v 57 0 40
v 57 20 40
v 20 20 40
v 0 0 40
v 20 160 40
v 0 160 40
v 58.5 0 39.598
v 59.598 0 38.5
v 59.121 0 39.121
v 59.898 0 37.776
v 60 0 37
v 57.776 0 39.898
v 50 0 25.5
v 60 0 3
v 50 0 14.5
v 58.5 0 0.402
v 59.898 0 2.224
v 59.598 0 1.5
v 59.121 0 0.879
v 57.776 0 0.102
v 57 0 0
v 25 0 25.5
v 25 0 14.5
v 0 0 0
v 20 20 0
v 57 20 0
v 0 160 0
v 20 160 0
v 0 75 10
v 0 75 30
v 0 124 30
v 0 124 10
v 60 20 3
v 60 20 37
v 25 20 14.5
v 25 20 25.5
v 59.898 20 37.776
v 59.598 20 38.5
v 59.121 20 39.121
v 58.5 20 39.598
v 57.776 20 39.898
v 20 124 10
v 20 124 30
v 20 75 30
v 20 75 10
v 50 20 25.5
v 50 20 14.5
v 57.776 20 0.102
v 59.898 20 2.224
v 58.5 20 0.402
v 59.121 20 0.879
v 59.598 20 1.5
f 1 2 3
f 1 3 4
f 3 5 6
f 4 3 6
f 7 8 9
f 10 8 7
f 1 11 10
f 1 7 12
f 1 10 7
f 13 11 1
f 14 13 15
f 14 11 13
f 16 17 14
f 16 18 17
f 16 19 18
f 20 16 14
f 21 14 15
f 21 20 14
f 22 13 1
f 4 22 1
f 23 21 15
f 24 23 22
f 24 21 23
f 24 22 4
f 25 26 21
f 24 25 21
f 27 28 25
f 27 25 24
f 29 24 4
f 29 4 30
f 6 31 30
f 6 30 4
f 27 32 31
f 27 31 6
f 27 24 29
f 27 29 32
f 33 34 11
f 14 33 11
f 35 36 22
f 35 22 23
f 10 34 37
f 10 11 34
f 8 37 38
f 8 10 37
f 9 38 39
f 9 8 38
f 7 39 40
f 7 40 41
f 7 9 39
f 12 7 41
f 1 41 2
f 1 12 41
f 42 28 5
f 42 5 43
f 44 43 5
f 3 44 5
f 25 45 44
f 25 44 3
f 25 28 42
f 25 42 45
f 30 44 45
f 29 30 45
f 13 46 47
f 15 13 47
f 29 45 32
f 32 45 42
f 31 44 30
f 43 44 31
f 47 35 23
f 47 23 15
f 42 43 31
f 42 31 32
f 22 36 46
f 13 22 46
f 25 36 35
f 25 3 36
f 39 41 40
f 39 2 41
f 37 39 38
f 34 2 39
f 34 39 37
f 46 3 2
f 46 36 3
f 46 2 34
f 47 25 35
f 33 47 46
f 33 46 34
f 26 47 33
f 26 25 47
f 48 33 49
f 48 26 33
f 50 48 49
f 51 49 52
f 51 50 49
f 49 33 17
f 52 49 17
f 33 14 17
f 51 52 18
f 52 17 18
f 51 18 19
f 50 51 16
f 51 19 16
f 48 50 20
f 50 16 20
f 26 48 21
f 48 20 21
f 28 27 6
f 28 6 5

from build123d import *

# Parameters (mm, degrees)
BOSS_EXTRUDE1_DEPTH = 40
FILLET1_R           = 3
SKETCH2_W           = 25
SKETCH2_H           = 11
CUT_EXTRUDE1_DEPTH  = 158.48015748
SKETCH3_W           = 20
SKETCH3_H           = 49
CUT_EXTRUDE2_DEPTH  = 170.705627485


with BuildPart() as part:
    # Sketch1 → Boss-Extrude1 (new body)
    with BuildSketch(Plane.XY):
        Polygon((0, 0), (0, 160), (20, 160), (20, 20), (60, 20), (60, 0), align=None)
    extrude(amount=BOSS_EXTRUDE1_DEPTH)

    # Fillet1
    fillet1_edges = [part.edges().sort_by_distance(p)[0] for p in [
        (60, 10, 40),
        (60, 10, 0),
    ]]
    fillet(fillet1_edges, radius=FILLET1_R)

    # Sketch2 → Cut-Extrude1 (cut, through all)
    with BuildSketch(Plane(origin=(0, 20, 0), x_dir=(1, 0, 0), z_dir=(0, 1, 0))):
        with Locations((37.5, -20)):
            Rectangle(SKETCH2_W, SKETCH2_H)
    extrude(amount=-CUT_EXTRUDE1_DEPTH, mode=Mode.SUBTRACT)

    # Sketch3 → Cut-Extrude2 (cut, through all)
    with BuildSketch(Plane(origin=(20, 0, 0), x_dir=(0, 0, -1), z_dir=(1, 0, 0))):
        with Locations((-20, 99.5)):
            Rectangle(SKETCH3_W, SKETCH3_H)
    extrude(amount=-CUT_EXTRUDE2_DEPTH, mode=Mode.SUBTRACT)


solid = part.part
